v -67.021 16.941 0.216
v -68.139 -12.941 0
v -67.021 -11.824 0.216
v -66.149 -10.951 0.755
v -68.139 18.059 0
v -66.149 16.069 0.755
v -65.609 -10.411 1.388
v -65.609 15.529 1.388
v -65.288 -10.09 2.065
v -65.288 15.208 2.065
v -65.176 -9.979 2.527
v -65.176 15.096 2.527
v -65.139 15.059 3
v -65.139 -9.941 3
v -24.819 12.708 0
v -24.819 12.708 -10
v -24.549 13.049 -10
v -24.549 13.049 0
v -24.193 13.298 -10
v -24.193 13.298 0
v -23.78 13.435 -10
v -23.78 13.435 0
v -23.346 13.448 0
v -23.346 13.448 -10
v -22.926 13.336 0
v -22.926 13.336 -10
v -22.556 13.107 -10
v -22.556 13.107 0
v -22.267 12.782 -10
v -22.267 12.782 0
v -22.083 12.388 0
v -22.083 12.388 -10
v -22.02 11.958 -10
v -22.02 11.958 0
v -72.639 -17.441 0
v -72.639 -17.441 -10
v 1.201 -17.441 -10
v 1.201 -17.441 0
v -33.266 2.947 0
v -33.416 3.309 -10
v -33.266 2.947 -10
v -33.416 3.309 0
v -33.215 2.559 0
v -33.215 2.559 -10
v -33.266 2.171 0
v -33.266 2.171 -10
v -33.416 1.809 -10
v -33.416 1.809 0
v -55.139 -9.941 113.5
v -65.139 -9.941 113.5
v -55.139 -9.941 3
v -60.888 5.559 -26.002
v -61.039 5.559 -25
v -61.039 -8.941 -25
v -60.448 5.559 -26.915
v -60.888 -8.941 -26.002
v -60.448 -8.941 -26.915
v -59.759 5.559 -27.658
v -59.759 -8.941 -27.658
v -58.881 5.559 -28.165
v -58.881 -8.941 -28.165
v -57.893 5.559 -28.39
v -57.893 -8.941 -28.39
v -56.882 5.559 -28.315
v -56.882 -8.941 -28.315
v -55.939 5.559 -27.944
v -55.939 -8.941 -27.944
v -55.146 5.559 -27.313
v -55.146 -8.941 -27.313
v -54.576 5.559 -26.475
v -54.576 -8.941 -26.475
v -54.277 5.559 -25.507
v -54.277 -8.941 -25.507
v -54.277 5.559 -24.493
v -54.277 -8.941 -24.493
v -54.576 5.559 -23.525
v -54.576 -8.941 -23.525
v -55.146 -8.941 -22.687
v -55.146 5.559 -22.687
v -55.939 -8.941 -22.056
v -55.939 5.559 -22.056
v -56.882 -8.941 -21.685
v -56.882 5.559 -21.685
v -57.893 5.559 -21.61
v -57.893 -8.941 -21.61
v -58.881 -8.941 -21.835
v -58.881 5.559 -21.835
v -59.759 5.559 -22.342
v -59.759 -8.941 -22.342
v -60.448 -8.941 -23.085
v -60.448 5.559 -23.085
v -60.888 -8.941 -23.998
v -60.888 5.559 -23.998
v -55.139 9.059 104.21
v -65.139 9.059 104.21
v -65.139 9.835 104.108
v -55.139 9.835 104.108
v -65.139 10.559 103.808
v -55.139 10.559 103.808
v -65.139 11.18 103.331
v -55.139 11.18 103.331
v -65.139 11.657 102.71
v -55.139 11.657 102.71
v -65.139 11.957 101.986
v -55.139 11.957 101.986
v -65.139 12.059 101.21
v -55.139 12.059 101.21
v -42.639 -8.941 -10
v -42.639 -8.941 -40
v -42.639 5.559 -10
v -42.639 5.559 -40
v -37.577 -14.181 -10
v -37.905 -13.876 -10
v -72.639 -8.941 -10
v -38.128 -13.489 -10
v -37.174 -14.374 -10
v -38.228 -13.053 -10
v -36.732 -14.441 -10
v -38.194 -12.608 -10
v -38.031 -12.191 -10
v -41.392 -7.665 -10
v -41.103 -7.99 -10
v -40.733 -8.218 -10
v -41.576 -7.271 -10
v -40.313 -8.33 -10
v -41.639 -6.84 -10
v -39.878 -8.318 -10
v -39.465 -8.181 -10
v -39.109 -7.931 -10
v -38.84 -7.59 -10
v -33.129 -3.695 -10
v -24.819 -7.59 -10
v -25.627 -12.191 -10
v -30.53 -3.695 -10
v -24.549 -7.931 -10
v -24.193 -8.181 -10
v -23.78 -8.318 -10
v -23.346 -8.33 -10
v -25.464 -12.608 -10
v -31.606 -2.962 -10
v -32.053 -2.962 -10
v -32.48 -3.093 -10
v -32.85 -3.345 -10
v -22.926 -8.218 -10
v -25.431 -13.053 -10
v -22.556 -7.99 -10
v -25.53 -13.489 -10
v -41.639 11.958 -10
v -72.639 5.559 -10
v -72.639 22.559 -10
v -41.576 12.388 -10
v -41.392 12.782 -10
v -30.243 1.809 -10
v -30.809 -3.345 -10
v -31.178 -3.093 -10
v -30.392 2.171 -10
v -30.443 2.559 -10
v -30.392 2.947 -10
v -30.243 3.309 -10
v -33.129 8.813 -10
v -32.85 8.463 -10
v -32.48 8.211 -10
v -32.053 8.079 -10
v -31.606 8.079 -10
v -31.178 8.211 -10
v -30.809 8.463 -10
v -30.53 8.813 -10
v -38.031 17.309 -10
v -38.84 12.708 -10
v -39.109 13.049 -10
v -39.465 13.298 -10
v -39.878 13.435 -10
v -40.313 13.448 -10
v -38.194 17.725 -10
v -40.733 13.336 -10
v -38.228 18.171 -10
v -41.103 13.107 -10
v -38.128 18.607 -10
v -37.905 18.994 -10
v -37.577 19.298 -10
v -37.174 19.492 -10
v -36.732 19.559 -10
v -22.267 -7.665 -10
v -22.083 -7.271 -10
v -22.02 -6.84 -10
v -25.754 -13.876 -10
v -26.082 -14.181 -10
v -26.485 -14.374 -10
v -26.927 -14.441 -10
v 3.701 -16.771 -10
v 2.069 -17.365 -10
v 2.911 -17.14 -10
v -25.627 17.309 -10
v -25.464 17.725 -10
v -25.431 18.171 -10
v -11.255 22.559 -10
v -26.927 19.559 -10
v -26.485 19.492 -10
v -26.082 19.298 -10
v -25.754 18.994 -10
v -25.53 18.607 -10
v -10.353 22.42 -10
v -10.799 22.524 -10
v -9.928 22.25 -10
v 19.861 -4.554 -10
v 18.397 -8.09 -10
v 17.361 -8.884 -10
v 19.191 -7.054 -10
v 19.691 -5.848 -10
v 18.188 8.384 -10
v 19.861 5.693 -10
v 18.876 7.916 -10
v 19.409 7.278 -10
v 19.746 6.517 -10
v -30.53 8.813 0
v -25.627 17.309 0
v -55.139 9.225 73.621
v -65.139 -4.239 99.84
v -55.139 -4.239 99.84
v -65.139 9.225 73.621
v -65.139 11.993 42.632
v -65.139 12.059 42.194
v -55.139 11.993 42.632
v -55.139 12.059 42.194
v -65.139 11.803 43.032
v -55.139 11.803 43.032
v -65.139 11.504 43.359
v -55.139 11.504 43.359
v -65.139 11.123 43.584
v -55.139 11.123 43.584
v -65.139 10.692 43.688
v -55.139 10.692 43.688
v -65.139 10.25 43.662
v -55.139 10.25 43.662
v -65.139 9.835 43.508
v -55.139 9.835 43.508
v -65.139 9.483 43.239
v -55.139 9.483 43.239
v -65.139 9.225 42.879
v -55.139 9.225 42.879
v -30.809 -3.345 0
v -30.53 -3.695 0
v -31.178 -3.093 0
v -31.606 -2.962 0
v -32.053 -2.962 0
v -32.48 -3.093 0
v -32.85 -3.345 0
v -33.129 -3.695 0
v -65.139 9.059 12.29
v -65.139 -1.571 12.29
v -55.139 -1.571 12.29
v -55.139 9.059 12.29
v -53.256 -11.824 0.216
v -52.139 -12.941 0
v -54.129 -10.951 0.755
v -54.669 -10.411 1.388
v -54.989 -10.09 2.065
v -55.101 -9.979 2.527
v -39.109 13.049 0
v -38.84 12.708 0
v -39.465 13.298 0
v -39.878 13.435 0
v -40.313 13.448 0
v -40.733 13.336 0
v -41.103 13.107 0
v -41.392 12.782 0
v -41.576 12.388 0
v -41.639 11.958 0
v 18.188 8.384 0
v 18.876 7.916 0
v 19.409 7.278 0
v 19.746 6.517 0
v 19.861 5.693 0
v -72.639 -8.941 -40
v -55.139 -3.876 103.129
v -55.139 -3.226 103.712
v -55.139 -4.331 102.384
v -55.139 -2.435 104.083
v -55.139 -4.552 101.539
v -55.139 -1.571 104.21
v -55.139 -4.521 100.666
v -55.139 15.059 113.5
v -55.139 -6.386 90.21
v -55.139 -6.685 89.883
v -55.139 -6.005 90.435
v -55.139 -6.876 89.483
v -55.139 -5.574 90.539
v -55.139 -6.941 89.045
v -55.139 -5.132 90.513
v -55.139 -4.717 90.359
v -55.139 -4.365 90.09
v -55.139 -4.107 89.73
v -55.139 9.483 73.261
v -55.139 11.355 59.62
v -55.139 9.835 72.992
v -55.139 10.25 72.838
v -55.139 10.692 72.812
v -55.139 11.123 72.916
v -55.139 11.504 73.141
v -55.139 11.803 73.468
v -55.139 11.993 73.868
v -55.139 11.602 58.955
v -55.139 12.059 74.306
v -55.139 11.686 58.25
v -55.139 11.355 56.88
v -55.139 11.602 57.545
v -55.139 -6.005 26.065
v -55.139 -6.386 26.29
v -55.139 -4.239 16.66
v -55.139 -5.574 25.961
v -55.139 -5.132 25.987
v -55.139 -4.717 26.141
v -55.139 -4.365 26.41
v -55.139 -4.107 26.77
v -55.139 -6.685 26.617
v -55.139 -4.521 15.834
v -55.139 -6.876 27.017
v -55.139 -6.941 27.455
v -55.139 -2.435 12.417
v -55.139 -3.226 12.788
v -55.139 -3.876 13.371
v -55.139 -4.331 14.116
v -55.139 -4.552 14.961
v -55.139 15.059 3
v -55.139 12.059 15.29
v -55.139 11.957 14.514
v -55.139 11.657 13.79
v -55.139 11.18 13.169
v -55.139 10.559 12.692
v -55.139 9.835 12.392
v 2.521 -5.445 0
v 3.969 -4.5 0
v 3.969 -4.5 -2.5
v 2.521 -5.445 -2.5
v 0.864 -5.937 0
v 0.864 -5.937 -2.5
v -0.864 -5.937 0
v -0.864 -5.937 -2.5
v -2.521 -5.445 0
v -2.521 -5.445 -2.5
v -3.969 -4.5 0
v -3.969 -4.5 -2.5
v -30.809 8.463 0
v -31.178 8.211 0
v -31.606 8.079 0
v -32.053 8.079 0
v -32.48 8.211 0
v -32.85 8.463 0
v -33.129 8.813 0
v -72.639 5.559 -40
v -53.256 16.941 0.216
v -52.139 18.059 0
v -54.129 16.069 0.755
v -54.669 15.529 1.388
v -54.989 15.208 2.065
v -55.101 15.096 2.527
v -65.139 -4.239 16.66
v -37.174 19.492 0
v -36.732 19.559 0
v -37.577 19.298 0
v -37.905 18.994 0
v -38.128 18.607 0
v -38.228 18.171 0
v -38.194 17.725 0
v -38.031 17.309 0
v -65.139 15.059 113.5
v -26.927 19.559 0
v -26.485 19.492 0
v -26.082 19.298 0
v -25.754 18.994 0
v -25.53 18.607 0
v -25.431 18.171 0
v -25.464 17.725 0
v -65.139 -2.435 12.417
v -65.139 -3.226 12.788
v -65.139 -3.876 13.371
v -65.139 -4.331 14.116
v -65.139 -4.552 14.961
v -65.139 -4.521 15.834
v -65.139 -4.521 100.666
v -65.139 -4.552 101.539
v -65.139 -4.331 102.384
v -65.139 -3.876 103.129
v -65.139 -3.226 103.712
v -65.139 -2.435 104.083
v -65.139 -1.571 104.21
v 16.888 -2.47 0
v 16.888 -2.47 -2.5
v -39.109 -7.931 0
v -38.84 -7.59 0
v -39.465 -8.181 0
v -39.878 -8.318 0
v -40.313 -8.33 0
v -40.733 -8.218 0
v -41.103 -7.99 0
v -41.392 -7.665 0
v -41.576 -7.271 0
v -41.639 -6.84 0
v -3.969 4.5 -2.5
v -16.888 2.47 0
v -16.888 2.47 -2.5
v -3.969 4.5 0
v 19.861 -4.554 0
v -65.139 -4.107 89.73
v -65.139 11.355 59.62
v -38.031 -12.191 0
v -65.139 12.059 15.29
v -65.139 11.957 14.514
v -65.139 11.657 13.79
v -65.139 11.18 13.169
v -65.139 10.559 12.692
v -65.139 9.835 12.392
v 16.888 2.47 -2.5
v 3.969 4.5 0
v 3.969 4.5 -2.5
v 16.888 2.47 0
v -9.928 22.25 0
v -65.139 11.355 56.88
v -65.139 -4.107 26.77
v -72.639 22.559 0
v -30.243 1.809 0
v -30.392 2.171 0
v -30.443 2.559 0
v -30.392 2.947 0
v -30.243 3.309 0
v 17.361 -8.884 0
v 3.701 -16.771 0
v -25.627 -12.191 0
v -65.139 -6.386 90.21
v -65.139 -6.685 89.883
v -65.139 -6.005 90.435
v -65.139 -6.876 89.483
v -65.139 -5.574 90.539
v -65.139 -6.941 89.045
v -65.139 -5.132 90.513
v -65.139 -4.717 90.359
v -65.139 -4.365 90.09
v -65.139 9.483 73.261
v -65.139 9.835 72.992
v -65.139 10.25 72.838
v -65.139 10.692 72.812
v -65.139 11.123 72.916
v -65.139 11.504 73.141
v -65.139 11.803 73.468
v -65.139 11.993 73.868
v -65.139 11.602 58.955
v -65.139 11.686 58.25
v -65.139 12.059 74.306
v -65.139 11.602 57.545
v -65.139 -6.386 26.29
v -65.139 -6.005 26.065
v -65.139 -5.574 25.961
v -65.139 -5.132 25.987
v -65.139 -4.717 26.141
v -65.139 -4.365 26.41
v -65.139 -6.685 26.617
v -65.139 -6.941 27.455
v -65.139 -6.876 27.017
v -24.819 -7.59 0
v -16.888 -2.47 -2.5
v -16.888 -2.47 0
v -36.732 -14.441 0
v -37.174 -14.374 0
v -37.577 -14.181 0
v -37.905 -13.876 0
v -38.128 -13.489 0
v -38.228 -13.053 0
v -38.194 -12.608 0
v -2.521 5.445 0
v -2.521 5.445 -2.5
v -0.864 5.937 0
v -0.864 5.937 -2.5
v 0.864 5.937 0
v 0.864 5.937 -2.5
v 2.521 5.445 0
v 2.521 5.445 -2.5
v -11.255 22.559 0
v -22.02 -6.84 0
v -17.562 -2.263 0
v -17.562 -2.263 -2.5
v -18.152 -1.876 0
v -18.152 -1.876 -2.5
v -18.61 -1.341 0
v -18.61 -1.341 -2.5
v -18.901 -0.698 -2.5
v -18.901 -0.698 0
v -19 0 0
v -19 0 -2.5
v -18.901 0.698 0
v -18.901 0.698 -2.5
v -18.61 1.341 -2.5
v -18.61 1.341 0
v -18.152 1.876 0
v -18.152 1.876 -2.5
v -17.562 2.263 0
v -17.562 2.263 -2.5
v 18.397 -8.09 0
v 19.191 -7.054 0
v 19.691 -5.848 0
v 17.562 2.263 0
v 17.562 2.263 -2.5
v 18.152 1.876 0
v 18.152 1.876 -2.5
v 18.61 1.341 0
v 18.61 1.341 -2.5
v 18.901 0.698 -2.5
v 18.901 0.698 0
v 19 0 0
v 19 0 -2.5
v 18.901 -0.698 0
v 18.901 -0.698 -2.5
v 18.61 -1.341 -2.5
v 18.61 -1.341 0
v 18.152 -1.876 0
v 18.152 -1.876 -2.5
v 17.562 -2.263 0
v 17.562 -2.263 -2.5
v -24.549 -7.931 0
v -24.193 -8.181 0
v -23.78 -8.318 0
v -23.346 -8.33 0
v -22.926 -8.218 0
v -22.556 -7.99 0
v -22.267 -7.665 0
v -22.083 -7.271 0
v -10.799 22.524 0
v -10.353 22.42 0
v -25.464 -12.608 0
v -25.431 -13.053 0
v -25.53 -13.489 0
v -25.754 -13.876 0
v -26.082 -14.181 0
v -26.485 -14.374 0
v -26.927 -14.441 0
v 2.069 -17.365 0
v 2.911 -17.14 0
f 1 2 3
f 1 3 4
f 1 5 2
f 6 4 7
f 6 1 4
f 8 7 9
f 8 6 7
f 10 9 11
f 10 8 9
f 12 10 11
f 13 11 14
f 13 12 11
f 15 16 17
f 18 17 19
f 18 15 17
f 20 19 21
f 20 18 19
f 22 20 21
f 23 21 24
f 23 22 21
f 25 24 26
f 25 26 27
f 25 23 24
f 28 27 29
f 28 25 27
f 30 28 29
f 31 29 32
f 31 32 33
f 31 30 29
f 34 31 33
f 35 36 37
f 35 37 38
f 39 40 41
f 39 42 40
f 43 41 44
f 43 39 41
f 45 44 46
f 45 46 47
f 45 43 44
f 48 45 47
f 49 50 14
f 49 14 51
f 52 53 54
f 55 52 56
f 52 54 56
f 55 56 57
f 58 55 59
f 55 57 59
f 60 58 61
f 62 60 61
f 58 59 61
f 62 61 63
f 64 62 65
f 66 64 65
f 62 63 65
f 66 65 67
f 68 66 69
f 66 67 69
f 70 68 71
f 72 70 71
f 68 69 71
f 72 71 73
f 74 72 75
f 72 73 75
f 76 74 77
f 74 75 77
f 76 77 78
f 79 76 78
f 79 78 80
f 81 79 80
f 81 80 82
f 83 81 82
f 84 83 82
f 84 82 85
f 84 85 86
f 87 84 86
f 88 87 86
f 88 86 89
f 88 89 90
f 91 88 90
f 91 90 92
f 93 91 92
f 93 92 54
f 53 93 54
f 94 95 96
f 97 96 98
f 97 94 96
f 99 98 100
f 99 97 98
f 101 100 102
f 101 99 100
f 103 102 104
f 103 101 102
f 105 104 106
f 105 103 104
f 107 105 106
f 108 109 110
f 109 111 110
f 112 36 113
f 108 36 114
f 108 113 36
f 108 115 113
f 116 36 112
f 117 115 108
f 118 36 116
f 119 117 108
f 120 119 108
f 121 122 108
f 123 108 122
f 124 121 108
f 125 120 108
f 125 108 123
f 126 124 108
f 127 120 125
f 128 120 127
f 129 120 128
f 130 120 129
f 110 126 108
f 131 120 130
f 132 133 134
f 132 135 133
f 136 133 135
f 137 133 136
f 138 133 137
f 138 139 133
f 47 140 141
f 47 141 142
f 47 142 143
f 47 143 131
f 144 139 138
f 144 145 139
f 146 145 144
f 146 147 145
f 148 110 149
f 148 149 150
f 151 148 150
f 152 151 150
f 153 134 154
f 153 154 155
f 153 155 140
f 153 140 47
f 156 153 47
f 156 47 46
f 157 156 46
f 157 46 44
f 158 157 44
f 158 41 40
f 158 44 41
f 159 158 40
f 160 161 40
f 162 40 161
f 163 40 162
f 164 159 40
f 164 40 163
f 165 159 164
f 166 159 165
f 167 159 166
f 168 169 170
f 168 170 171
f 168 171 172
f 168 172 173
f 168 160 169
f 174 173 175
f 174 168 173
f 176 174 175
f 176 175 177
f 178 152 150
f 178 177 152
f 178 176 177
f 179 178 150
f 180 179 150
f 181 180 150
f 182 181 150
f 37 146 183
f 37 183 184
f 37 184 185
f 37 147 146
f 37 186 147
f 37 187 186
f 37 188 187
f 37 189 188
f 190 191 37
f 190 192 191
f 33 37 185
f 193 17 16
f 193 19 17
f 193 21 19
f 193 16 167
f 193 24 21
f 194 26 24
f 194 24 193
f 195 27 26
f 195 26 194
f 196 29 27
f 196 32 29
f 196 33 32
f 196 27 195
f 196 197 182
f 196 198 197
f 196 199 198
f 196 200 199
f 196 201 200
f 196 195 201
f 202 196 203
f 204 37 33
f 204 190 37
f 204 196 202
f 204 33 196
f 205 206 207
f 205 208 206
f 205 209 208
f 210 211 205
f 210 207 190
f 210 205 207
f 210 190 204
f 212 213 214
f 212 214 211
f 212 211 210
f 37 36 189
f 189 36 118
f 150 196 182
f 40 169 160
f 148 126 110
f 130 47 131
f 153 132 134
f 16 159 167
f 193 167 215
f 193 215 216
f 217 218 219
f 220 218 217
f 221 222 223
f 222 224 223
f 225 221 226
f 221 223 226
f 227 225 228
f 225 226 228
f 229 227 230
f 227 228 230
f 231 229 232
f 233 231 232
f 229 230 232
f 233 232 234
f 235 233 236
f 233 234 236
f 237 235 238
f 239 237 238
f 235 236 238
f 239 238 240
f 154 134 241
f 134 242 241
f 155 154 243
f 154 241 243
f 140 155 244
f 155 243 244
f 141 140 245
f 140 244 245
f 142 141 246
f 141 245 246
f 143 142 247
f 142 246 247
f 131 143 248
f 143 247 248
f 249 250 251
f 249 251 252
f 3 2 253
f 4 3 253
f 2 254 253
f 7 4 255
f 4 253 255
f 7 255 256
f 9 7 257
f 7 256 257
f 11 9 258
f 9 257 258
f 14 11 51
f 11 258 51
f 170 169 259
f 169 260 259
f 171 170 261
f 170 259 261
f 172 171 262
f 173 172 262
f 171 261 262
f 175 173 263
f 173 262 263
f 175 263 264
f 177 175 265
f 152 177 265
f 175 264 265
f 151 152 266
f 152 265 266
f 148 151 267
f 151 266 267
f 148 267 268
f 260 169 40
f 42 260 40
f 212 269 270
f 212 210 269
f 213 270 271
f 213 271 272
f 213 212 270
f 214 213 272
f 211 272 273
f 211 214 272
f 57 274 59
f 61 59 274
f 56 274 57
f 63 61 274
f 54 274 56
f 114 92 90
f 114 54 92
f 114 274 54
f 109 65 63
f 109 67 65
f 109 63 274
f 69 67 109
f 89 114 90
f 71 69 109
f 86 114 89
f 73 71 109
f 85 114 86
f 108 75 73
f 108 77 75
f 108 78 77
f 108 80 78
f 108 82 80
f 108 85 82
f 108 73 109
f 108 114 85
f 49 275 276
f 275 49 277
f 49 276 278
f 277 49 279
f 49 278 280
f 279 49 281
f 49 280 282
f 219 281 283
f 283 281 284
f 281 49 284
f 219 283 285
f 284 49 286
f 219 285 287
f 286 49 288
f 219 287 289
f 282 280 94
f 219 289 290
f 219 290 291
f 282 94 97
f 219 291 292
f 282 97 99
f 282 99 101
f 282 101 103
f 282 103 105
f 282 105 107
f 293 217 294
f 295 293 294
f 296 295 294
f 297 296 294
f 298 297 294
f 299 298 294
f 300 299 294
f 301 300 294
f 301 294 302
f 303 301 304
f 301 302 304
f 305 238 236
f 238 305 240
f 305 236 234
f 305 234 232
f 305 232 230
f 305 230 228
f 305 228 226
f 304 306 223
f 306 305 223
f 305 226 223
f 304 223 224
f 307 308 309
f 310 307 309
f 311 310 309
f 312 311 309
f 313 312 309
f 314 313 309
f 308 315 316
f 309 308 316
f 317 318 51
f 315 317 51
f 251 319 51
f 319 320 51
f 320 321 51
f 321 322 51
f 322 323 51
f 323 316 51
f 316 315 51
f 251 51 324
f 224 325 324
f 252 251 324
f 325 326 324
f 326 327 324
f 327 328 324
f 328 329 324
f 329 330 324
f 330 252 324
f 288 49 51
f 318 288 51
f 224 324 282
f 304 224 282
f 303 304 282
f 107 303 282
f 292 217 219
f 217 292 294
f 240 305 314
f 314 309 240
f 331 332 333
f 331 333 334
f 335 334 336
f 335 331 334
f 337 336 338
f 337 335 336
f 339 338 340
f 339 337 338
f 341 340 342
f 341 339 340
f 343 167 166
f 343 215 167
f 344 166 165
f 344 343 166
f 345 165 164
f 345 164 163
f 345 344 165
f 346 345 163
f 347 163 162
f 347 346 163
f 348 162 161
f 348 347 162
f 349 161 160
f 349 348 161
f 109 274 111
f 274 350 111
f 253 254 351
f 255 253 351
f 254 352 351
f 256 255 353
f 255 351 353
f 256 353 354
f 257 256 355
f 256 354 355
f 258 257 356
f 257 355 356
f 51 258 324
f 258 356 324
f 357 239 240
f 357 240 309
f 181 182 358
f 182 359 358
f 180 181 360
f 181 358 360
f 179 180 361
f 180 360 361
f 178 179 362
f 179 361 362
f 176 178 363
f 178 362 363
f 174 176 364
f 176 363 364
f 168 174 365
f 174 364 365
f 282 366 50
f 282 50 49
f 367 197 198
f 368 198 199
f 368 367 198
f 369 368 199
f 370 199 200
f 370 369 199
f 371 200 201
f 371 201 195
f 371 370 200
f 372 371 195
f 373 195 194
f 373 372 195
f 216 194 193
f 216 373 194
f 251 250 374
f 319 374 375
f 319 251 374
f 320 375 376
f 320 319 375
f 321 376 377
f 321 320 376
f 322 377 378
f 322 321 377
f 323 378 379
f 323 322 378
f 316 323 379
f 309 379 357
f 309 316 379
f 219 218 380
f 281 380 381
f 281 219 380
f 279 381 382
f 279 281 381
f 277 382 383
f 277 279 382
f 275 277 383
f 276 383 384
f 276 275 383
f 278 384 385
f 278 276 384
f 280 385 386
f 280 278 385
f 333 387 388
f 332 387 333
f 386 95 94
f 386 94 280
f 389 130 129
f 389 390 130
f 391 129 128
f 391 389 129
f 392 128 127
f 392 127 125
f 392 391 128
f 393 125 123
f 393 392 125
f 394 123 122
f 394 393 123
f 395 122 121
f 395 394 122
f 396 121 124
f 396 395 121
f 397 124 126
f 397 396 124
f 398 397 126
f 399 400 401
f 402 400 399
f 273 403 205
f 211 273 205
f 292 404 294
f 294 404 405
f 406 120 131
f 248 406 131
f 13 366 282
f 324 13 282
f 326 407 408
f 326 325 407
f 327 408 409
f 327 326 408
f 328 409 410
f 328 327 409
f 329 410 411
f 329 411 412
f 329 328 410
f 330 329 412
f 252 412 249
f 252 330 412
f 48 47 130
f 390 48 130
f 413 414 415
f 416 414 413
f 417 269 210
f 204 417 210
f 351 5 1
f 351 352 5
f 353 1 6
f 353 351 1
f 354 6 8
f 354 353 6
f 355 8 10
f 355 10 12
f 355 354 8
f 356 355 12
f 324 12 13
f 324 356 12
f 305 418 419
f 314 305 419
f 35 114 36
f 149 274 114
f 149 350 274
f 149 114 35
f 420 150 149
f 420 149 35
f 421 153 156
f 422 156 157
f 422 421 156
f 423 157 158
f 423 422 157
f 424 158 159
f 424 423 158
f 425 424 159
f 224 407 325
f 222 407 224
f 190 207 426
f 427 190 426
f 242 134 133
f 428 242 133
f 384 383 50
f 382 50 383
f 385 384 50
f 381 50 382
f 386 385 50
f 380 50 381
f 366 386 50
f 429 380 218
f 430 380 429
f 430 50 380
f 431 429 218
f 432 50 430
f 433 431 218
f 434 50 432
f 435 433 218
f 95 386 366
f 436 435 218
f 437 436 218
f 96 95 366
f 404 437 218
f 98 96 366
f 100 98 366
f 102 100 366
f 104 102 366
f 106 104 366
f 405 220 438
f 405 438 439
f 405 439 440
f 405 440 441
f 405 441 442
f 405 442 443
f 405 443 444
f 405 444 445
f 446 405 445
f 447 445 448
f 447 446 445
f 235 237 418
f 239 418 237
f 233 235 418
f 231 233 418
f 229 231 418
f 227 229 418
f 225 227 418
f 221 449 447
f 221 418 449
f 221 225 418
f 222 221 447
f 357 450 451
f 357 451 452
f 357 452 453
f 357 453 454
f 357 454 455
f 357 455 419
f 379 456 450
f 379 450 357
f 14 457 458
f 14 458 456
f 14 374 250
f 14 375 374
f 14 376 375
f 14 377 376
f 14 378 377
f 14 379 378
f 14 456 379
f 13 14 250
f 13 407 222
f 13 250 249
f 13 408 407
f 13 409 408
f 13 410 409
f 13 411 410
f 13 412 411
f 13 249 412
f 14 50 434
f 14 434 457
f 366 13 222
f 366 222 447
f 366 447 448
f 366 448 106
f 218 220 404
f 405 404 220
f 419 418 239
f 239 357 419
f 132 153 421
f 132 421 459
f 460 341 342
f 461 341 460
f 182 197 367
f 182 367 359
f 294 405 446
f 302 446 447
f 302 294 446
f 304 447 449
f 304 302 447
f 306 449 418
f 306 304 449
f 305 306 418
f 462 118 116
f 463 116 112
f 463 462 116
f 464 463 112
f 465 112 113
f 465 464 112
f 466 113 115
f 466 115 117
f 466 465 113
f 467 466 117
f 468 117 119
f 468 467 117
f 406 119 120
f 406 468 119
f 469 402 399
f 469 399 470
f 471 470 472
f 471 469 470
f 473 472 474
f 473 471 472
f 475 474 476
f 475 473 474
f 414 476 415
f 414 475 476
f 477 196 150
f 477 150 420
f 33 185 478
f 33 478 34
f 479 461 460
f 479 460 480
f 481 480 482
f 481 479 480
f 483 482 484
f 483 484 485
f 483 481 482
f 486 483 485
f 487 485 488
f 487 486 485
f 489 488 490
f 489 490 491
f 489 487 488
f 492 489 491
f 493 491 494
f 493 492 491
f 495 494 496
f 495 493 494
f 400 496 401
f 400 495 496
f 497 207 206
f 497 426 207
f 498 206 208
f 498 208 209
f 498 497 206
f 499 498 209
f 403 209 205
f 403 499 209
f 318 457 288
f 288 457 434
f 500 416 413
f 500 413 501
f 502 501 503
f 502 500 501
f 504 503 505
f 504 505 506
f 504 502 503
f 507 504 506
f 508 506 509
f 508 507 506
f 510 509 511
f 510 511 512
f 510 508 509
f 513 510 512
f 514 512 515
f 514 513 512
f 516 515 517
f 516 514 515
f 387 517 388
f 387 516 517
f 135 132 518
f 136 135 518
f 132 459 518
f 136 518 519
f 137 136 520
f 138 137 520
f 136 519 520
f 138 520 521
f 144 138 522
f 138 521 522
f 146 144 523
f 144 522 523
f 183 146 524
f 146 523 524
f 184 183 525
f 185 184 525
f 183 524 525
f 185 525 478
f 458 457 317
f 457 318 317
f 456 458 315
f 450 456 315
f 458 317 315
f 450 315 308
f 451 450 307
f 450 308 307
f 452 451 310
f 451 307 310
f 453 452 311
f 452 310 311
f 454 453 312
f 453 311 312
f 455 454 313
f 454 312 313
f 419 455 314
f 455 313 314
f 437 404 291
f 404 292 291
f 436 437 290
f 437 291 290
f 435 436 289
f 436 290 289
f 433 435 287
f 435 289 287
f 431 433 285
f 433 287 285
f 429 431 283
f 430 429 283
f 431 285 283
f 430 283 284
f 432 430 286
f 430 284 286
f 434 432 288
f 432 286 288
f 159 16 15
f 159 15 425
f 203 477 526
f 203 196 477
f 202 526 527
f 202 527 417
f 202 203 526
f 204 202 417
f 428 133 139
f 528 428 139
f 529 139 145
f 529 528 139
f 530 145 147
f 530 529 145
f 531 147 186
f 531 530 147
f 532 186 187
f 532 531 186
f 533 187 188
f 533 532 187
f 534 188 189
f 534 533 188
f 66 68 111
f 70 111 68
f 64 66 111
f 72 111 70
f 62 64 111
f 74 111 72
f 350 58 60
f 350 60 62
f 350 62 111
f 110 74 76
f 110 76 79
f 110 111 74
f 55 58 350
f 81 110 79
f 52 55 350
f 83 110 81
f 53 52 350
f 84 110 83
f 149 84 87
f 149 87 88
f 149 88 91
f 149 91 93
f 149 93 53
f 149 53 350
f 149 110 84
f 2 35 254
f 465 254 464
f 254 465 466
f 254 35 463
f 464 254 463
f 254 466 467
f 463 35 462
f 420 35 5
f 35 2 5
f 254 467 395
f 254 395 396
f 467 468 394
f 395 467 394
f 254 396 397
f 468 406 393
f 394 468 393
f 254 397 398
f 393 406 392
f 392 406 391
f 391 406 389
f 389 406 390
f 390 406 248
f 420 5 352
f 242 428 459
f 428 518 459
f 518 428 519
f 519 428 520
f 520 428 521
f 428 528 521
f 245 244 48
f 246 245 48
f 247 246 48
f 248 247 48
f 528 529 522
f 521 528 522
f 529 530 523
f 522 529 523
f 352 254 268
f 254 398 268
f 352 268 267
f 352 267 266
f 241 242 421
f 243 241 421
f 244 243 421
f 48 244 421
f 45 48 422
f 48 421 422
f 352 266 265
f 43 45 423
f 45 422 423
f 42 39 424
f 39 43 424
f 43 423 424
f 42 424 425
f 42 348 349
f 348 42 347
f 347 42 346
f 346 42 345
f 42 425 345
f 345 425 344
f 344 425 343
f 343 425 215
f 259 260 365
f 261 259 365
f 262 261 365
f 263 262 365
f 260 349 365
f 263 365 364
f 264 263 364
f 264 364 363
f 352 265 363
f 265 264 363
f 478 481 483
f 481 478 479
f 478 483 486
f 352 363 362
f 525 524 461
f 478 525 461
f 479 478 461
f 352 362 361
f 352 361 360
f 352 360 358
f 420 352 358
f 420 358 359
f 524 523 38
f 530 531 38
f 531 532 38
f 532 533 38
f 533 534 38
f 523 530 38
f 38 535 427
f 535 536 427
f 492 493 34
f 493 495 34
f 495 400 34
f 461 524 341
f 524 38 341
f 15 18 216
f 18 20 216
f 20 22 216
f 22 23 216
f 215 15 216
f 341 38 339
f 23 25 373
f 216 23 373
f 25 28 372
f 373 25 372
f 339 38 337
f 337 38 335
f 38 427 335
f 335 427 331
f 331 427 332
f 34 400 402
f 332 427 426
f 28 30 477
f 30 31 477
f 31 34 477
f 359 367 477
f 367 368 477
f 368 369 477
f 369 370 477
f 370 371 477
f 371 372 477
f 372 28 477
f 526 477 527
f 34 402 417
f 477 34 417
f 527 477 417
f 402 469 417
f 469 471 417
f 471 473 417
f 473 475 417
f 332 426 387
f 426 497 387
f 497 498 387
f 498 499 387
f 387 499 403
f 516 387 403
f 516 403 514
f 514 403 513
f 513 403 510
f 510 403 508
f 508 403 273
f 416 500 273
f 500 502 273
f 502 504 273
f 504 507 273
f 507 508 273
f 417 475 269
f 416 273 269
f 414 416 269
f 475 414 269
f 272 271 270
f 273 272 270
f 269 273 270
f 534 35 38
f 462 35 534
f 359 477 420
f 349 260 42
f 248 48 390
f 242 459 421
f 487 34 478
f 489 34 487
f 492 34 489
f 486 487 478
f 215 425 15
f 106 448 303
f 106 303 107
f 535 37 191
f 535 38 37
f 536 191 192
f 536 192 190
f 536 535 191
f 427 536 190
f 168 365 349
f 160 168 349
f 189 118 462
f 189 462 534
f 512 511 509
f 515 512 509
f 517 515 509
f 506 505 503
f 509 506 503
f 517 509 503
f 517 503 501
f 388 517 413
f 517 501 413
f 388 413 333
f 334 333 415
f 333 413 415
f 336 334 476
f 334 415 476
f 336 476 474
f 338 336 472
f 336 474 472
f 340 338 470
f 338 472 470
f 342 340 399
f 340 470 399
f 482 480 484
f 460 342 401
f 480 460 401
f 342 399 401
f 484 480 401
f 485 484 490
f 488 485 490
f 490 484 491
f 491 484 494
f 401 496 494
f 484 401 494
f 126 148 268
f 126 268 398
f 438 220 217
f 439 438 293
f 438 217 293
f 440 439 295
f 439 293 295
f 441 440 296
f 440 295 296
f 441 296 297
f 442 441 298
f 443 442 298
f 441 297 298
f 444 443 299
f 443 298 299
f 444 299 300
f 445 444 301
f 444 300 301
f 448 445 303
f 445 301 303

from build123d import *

# Parameters (mm, degrees)
SKETCH3_W             = 42.5
SKETCH3_H             = 15
BOSS_EXTRUDE1_DEPTH   = 10
CUT_EXTRUDE1_DEPTH    = 2.5
SKETCH11_W            = 42.5
SKETCH11_H            = 10
BOSS_EXTRUDE5_DEPTH   = 10
SKETCH14_W            = 42.5
SKETCH14_H            = 10
BOSS_EXTRUDE7_DEPTH   = 15
SKETCH20_W            = 10
SKETCH20_H            = 40
BOSS_EXTRUDE10_DEPTH  = 50
SKETCH21_W            = 10
SKETCH21_H            = 25
BOSS_EXTRUDE11_DEPTH  = 113.5
SKETCH22_W            = 30
SKETCH22_H            = 6
BOSS_EXTRUDE12_DEPTH  = 30
SKETCH23_W            = 30
SKETCH23_H            = 30
BOSS_EXTRUDE13_DEPTH  = 8.5
FILLET1_R             = 3
CHAMFER1_SIZE         = 15
CHAMFER1_SIZE2        = 30.41699103
FILLET2_R             = 3
CHAMFER2_SIZE         = 10
CHAMFER2_SIZE2        = 17.320508076
FILLET3_R             = 5
CUT_EXTRUDE2_DEPTH    = 144.583262507
FILLET4_R             = 3
FILLET5_R             = 1.5
M8_TAPPED_HOLE1_D     = 6.8
M8_TAPPED_HOLE1_DEPTH = 22.25
M8_TAPPED_HOLE1_TIP   = 2.042926105
CUT_EXTRUDE3_DEPTH    = 141.312152004
FILLET6_R             = 1.5


with BuildPart() as part:
    # Sketch3 → Boss-Extrude1 (new body)
    with BuildSketch(Plane.XY):
        with Locations((-1.388845539, 0.05888455)):
            Rectangle(SKETCH3_W, SKETCH3_H)
    extrude(amount=-BOSS_EXTRUDE1_DEPTH)

    # Sketch2 → Cut-Extrude1 (cut)
    with BuildSketch(Plane.XY):
        with BuildLine():
            Line((-16.888114198, 2.469689731), (-3.968626967, 4.5))
            ThreePointArc((-3.968626967, 4.5), (0, 6), (3.968626967, 4.5))
            Line((3.968626967, 4.5), (16.888114198, 2.469689731))
            ThreePointArc((16.888114198, 2.469689731), (19, 0), (16.888114198, -2.469689731))
            Line((16.888114198, -2.469689731), (3.968626967, -4.5))
            ThreePointArc((3.968626967, -4.5), (0, -6), (-3.968626967, -4.5))
            Line((-3.968626967, -4.5), (-16.888114198, -2.469689731))
            ThreePointArc((-16.888114198, -2.469689731), (-19, 0), (-16.888114198, 2.469689731))
        make_face()
    extrude(amount=-CUT_EXTRUDE1_DEPTH, mode=Mode.SUBTRACT)

    # Sketch11 → Boss-Extrude5 (add)
    with BuildSketch(Plane.XZ.offset(7.44111545)):
        with Locations((-1.388845539, -5)):
            Rectangle(SKETCH11_W, SKETCH11_H)
    extrude(amount=BOSS_EXTRUDE5_DEPTH)

    # Sketch14 → Boss-Extrude7 (add)
    with BuildSketch(Plane(origin=(0, 7.55888455, 0), x_dir=(1, 0, 0), z_dir=(0, 1, 0))):
        with Locations((-1.388845539, 5)):
            Rectangle(SKETCH14_W, SKETCH14_H)
    extrude(amount=BOSS_EXTRUDE7_DEPTH)

    # Sketch20 → Boss-Extrude10 (add)
    with BuildSketch(Plane.ZY.offset(22.638845539)):
        with Locations((-5, 2.55888455)):
            Rectangle(SKETCH20_W, SKETCH20_H)
    extrude(amount=BOSS_EXTRUDE10_DEPTH)

    # Sketch21 → Boss-Extrude11 (add)
    with BuildSketch(Plane.XY):
        with Locations((-60.138845539, 2.55888455)):
            Rectangle(SKETCH21_W, SKETCH21_H)
    extrude(amount=BOSS_EXTRUDE11_DEPTH)

    # Sketch22 → Boss-Extrude12 (add)
    with BuildSketch(Plane(origin=(0, 0, -10), x_dir=(-1, 0, 0), z_dir=(0, 0, -1))):
        with Locations((57.638845539, 2.55888455)):
            Rectangle(SKETCH22_W, SKETCH22_H)
    extrude(amount=BOSS_EXTRUDE12_DEPTH)

    # Sketch23 → Boss-Extrude13 (add)
    with BuildSketch(Plane.XZ.offset(0.44111545)):
        with Locations((-57.638845539, -25)):
            Rectangle(SKETCH23_W, SKETCH23_H)
    extrude(amount=BOSS_EXTRUDE13_DEPTH)

    # Fillet1
    fillet1_edges = [part.edges().sort_by_distance(p)[0] for p in [
        (-65.138845539, 2.55888455, 0),
        (-60.138845539, -9.94111545, 0),
        (-55.138845539, 2.55888455, 0),
        (-60.138845539, 15.05888455, 0),
    ]]
    fillet(fillet1_edges, radius=FILLET1_R)

    # Chamfer1
    chamfer1_edges = [part.edges().sort_by_distance(p)[0] for p in [
        (19.861154461, 22.55888455, -5),
    ]]
    chamfer1_side = [part.faces().sort_by_distance(p)[0] for p in [
        (19.861154461, 2.55888455, -5),
    ]]
    chamfer(chamfer1_edges, length=CHAMFER1_SIZE, length2=CHAMFER1_SIZE2, reference=chamfer1_side[0])

    # Fillet2
    fillet2_edges = [part.edges().sort_by_distance(p)[0] for p in [
        (-10.555836569, 22.55888455, -5),
        (19.861154461, 7.55888455, -5),
    ]]
    fillet(fillet2_edges, radius=FILLET2_R)

    # Chamfer2
    chamfer2_edges = [part.edges().sort_by_distance(p)[0] for p in [
        (19.861154461, -17.44111545, -5),
    ]]
    chamfer2_side = [part.faces().sort_by_distance(p)[0] for p in [
        (19.861154461, -5.873875391, -5),
    ]]
    chamfer(chamfer2_edges, length=CHAMFER2_SIZE, length2=CHAMFER2_SIZE2, reference=chamfer2_side[0])

    # Fillet3
    fillet3_edges = [part.edges().sort_by_distance(p)[0] for p in [
        (2.540646385, -17.44111545, -5),
        (19.861154461, -7.44111545, -5),
    ]]
    fillet(fillet3_edges, radius=FILLET3_R)

    # Sketch24 → Cut-Extrude2 (cut, through all)
    with BuildSketch(Plane.ZY.offset(65.138845539)):
        Polygon((58.25, -6.94111545), (95.25, -6.94111545), (58.25, 12.05888455), (21.25, -6.94111545), align=None)
        Polygon((48.39896268, 12.05888455), (12.290027833, -6.483541453), (12.290027833, 12.05888455), align=None)
        Polygon((68.10103732, 12.05888455), (104.209972167, 12.05888455), (104.209972167, -6.483541453), align=None)
    extrude(amount=-CUT_EXTRUDE2_DEPTH, mode=Mode.SUBTRACT)

    # Fillet4
    fillet4_edges = [part.edges().sort_by_distance(p)[0] for p in [
        (-60.138845539, -6.483541453, 104.209972167),
        (-60.138845539, 12.05888455, 104.209972167),
        (-60.138845539, 12.05888455, 12.290027833),
        (-60.138845539, -6.483541453, 12.290027833),
        (-60.138845539, 12.05888455, 58.25),
    ]]
    fillet(fillet4_edges, radius=FILLET4_R)

    # Fillet5
    fillet5_edges = [part.edges().sort_by_distance(p)[0] for p in [
        (-60.138845539, 12.05888455, 68.10103732),
        (-60.138845539, 12.05888455, 48.39896268),
        (-60.138845539, -6.94111545, 21.25),
        (-60.138845539, -6.94111545, 95.25),
    ]]
    fillet(fillet5_edges, radius=FILLET5_R)

    # M8 Tapped Hole1
    with Locations(Plane(origin=(0, 5.55888455, 0), x_dir=(1, 0, 0), z_dir=(0, 1, 0))):
        with Locations((-57.638845539, 25)):
            Hole(M8_TAPPED_HOLE1_D / 2, depth=M8_TAPPED_HOLE1_DEPTH)
            with Locations((0, 0, -(M8_TAPPED_HOLE1_DEPTH + M8_TAPPED_HOLE1_TIP / 2))):  # 118° drill point
                Cone(0, M8_TAPPED_HOLE1_D / 2, M8_TAPPED_HOLE1_TIP, mode=Mode.SUBTRACT)

    # Sketch32 → Cut-Extrude3 (cut, through all)
    with BuildSketch(Plane(origin=(-42.638845539, 5.55888455, -10), x_dir=(1, 0, 0), z_dir=(0, 0, 1))):
        Polygon((10.809559843, 14), (3.309559843, 14), (10.809559843, 1.002474929), (18.309559843, 14), align=None)
        Polygon((1, 12), (9.65549398, -3), (1, -18), (1, -3), align=None)
        Polygon((10.809559843, -7.002474929), (18.309559843, -20), (10.809559843, -20), (3.309559843, -20), align=None)
        Polygon((20.619119687, -18), (20.619119687, -3), (20.619119687, 12), (11.963625707, -3), align=None)
    extrude(amount=CUT_EXTRUDE3_DEPTH, mode=Mode.SUBTRACT)

    # Fillet6
    fillet6_edges = [part.edges().sort_by_distance(p)[0] for p in [
        (-41.638845539, 17.55888455, -5),
        (-41.638845539, -12.44111545, -5),
        (-32.98335156, 2.55888455, -5),
        (-22.019725852, 17.55888455, -5),
        (-30.675219832, 2.55888455, -5),
        (-22.019725852, -12.44111545, -5),
        (-24.329285696, -14.44111545, -5),
        (-31.829285696, -1.44359038, -5),
        (-39.329285696, -14.44111545, -5),
        (-24.329285696, 19.55888455, -5),
        (-39.329285696, 19.55888455, -5),
        (-31.829285696, 6.561359479, -5),
    ]]
    fillet(fillet6_edges, radius=FILLET6_R)


solid = part.part
